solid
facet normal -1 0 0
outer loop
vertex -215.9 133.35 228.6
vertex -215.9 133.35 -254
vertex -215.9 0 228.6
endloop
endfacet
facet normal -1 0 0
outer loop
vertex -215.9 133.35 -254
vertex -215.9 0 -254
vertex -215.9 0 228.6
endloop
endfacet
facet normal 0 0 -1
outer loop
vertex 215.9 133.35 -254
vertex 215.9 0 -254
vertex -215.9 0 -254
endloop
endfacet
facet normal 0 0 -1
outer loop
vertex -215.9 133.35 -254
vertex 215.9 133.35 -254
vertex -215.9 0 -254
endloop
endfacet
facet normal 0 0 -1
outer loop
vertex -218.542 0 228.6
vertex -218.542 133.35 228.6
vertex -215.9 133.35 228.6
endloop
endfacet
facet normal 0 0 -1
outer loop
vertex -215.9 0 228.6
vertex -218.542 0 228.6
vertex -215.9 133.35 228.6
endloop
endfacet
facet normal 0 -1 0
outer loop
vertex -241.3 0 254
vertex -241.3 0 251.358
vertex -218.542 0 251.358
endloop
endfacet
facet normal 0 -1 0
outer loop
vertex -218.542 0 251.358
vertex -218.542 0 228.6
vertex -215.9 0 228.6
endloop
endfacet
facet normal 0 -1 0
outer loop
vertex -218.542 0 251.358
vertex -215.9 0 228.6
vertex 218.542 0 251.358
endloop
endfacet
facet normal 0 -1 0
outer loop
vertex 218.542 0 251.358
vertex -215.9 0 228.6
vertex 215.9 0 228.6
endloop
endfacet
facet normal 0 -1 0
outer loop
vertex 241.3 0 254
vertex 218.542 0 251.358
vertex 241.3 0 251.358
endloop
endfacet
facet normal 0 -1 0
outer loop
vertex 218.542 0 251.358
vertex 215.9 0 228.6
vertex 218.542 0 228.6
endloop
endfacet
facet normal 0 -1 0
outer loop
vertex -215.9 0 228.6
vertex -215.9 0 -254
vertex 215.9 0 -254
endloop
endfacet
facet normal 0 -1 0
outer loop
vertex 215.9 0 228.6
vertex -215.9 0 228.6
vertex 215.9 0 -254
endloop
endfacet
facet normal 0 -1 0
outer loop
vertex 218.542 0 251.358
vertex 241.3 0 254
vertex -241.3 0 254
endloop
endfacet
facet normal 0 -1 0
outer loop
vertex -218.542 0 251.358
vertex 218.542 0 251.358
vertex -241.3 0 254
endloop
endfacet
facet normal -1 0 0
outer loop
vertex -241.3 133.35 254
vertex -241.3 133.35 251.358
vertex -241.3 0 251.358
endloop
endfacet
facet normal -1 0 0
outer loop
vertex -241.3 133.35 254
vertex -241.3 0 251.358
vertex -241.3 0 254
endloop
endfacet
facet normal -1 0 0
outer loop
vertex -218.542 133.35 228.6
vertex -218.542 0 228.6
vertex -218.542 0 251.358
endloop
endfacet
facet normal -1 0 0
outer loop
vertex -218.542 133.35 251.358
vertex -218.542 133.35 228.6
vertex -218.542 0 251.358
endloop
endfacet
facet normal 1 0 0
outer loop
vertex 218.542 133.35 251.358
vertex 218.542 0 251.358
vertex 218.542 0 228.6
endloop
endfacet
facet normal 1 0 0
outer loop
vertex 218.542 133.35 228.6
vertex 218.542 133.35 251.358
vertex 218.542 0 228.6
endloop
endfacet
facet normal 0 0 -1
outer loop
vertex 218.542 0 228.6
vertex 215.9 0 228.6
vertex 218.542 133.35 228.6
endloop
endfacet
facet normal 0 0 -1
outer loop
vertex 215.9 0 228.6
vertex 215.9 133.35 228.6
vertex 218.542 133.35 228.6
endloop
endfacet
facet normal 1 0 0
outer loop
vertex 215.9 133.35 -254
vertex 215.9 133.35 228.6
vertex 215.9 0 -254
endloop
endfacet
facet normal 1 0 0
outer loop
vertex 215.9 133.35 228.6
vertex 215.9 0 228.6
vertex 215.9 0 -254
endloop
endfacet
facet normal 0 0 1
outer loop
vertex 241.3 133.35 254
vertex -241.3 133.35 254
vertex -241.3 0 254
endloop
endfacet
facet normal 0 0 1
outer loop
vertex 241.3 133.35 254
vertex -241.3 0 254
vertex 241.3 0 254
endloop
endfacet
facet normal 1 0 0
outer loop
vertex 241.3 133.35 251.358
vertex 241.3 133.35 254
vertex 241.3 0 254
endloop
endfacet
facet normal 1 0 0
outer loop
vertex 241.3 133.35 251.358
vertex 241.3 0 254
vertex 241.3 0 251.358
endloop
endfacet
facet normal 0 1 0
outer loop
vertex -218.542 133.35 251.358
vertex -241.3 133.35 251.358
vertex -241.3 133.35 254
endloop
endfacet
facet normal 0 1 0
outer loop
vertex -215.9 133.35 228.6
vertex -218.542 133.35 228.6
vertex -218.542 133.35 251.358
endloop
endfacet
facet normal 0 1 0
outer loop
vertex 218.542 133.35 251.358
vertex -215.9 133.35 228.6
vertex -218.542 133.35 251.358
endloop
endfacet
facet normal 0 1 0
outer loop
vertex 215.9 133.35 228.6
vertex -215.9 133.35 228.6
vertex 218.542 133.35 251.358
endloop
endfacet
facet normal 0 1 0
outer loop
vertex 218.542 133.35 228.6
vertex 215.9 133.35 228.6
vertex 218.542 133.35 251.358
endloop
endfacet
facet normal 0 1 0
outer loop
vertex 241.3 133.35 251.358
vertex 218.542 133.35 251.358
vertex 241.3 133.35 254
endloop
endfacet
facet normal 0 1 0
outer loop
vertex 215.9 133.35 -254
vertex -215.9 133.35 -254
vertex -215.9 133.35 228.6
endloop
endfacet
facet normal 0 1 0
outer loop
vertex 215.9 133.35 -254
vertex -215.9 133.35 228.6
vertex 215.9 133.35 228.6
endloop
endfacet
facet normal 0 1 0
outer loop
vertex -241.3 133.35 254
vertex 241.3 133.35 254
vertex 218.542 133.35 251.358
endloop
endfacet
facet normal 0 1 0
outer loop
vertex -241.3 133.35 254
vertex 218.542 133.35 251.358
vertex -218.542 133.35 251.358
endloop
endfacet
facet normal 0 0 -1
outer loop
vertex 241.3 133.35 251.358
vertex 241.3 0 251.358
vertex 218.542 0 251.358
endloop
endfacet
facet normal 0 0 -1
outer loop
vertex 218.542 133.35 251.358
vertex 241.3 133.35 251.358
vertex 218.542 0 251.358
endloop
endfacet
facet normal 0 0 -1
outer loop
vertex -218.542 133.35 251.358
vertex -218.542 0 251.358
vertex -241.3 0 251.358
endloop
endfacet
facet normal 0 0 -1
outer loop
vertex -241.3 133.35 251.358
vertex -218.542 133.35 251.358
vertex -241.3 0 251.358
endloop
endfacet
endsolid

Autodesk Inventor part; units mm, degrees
ref_plane "YZ Plane" through (0, 0, 0) normal (1, 0, 0) x (0, 1, 0)
ref_plane "XZ Plane" through (0, 0, 0) normal (0, 1, 0) x (-1, 0, 0)
ref_plane "XY Plane" through (0, 0, 0) normal (0, 0, 1) x (1, 0, 0)
sketch "Sketch2" plane through (0, 0, 0) normal (0, 1, 0) x (-1, 0, 0)
  line L0 (215.9, 254) -> (-215.9, 254)
  line L1 (-215.9, 254) -> (-215.9, -254)
  line L2 (-215.9, -254) -> (215.9, -254)
  line L3 (215.9, -254) -> (215.9, 254)
  line L4 (215.9, 254) -> (-215.9, -254) construction
  line L5 (-215.9, 254) -> (215.9, -254) construction
  point P0 (0, 0)
  point P1 (0, -254)
  dimension "d6" = 431.8
  dimension "d7" = 508
extrude "Extrusion3" add sketch "Sketch2" along normal blind 133.35
ref_plane "Work Plane3" through (0, 133.35, 254) normal (1, 0, 0) x (0, 1, 0)
sketch "Sketch4" plane through (0, 133.35, 0) normal (0, 1, 0) x (1, 0, 0)
  line L0 (-215.9, -254) -> (215.9, -254) projected
  line L1 (215.9, -228.6) -> (215.9, -254)
  line L2 (215.9, -254) -> (241.3, -254)
  line L3 (241.3, -251.3584) -> (218.5416, -251.3584)
  line L4 (218.5416, -251.3584) -> (218.5416, -228.6)
  line L5 (215.9, -228.6) -> (218.5416, -228.6)
  line L6 (215.9, -254) -> (215.9, 254) projected
  line L7 (241.3, -254) -> (241.3, -251.3584)
  point P0 (0, 0)
  dimension "d13" = 25.4
  dimension "d14" = 25.4
  dimension "d15" = 2.6416
extrude "Extrusion5" add sketch "Sketch4" against normal blind 133.35
mirror "Mirror1" about plane through (0, 133.35, 254) normal (1, 0, 0) of "Extrusion5"
equation "\"BendRadius\" = Thickness"
equation "\"BendReliefWidth\" = Thickness"
equation "\"BendReliefDepth\" = 0.5 * Thickness"
equation "\"CornerReliefSize\" = 4 * Thickness"
equation "\"MinimumRemnant\" = 2 * Thickness"
equation "\"TransitionRadius\" = BendRadius"
equation "\"JacobiRadiusSize\" = Thickness"
equation "\"GapSize\" = Thickness"
equation "\"Thickness\" = 3.048"
properties part number "powerDistribution"
